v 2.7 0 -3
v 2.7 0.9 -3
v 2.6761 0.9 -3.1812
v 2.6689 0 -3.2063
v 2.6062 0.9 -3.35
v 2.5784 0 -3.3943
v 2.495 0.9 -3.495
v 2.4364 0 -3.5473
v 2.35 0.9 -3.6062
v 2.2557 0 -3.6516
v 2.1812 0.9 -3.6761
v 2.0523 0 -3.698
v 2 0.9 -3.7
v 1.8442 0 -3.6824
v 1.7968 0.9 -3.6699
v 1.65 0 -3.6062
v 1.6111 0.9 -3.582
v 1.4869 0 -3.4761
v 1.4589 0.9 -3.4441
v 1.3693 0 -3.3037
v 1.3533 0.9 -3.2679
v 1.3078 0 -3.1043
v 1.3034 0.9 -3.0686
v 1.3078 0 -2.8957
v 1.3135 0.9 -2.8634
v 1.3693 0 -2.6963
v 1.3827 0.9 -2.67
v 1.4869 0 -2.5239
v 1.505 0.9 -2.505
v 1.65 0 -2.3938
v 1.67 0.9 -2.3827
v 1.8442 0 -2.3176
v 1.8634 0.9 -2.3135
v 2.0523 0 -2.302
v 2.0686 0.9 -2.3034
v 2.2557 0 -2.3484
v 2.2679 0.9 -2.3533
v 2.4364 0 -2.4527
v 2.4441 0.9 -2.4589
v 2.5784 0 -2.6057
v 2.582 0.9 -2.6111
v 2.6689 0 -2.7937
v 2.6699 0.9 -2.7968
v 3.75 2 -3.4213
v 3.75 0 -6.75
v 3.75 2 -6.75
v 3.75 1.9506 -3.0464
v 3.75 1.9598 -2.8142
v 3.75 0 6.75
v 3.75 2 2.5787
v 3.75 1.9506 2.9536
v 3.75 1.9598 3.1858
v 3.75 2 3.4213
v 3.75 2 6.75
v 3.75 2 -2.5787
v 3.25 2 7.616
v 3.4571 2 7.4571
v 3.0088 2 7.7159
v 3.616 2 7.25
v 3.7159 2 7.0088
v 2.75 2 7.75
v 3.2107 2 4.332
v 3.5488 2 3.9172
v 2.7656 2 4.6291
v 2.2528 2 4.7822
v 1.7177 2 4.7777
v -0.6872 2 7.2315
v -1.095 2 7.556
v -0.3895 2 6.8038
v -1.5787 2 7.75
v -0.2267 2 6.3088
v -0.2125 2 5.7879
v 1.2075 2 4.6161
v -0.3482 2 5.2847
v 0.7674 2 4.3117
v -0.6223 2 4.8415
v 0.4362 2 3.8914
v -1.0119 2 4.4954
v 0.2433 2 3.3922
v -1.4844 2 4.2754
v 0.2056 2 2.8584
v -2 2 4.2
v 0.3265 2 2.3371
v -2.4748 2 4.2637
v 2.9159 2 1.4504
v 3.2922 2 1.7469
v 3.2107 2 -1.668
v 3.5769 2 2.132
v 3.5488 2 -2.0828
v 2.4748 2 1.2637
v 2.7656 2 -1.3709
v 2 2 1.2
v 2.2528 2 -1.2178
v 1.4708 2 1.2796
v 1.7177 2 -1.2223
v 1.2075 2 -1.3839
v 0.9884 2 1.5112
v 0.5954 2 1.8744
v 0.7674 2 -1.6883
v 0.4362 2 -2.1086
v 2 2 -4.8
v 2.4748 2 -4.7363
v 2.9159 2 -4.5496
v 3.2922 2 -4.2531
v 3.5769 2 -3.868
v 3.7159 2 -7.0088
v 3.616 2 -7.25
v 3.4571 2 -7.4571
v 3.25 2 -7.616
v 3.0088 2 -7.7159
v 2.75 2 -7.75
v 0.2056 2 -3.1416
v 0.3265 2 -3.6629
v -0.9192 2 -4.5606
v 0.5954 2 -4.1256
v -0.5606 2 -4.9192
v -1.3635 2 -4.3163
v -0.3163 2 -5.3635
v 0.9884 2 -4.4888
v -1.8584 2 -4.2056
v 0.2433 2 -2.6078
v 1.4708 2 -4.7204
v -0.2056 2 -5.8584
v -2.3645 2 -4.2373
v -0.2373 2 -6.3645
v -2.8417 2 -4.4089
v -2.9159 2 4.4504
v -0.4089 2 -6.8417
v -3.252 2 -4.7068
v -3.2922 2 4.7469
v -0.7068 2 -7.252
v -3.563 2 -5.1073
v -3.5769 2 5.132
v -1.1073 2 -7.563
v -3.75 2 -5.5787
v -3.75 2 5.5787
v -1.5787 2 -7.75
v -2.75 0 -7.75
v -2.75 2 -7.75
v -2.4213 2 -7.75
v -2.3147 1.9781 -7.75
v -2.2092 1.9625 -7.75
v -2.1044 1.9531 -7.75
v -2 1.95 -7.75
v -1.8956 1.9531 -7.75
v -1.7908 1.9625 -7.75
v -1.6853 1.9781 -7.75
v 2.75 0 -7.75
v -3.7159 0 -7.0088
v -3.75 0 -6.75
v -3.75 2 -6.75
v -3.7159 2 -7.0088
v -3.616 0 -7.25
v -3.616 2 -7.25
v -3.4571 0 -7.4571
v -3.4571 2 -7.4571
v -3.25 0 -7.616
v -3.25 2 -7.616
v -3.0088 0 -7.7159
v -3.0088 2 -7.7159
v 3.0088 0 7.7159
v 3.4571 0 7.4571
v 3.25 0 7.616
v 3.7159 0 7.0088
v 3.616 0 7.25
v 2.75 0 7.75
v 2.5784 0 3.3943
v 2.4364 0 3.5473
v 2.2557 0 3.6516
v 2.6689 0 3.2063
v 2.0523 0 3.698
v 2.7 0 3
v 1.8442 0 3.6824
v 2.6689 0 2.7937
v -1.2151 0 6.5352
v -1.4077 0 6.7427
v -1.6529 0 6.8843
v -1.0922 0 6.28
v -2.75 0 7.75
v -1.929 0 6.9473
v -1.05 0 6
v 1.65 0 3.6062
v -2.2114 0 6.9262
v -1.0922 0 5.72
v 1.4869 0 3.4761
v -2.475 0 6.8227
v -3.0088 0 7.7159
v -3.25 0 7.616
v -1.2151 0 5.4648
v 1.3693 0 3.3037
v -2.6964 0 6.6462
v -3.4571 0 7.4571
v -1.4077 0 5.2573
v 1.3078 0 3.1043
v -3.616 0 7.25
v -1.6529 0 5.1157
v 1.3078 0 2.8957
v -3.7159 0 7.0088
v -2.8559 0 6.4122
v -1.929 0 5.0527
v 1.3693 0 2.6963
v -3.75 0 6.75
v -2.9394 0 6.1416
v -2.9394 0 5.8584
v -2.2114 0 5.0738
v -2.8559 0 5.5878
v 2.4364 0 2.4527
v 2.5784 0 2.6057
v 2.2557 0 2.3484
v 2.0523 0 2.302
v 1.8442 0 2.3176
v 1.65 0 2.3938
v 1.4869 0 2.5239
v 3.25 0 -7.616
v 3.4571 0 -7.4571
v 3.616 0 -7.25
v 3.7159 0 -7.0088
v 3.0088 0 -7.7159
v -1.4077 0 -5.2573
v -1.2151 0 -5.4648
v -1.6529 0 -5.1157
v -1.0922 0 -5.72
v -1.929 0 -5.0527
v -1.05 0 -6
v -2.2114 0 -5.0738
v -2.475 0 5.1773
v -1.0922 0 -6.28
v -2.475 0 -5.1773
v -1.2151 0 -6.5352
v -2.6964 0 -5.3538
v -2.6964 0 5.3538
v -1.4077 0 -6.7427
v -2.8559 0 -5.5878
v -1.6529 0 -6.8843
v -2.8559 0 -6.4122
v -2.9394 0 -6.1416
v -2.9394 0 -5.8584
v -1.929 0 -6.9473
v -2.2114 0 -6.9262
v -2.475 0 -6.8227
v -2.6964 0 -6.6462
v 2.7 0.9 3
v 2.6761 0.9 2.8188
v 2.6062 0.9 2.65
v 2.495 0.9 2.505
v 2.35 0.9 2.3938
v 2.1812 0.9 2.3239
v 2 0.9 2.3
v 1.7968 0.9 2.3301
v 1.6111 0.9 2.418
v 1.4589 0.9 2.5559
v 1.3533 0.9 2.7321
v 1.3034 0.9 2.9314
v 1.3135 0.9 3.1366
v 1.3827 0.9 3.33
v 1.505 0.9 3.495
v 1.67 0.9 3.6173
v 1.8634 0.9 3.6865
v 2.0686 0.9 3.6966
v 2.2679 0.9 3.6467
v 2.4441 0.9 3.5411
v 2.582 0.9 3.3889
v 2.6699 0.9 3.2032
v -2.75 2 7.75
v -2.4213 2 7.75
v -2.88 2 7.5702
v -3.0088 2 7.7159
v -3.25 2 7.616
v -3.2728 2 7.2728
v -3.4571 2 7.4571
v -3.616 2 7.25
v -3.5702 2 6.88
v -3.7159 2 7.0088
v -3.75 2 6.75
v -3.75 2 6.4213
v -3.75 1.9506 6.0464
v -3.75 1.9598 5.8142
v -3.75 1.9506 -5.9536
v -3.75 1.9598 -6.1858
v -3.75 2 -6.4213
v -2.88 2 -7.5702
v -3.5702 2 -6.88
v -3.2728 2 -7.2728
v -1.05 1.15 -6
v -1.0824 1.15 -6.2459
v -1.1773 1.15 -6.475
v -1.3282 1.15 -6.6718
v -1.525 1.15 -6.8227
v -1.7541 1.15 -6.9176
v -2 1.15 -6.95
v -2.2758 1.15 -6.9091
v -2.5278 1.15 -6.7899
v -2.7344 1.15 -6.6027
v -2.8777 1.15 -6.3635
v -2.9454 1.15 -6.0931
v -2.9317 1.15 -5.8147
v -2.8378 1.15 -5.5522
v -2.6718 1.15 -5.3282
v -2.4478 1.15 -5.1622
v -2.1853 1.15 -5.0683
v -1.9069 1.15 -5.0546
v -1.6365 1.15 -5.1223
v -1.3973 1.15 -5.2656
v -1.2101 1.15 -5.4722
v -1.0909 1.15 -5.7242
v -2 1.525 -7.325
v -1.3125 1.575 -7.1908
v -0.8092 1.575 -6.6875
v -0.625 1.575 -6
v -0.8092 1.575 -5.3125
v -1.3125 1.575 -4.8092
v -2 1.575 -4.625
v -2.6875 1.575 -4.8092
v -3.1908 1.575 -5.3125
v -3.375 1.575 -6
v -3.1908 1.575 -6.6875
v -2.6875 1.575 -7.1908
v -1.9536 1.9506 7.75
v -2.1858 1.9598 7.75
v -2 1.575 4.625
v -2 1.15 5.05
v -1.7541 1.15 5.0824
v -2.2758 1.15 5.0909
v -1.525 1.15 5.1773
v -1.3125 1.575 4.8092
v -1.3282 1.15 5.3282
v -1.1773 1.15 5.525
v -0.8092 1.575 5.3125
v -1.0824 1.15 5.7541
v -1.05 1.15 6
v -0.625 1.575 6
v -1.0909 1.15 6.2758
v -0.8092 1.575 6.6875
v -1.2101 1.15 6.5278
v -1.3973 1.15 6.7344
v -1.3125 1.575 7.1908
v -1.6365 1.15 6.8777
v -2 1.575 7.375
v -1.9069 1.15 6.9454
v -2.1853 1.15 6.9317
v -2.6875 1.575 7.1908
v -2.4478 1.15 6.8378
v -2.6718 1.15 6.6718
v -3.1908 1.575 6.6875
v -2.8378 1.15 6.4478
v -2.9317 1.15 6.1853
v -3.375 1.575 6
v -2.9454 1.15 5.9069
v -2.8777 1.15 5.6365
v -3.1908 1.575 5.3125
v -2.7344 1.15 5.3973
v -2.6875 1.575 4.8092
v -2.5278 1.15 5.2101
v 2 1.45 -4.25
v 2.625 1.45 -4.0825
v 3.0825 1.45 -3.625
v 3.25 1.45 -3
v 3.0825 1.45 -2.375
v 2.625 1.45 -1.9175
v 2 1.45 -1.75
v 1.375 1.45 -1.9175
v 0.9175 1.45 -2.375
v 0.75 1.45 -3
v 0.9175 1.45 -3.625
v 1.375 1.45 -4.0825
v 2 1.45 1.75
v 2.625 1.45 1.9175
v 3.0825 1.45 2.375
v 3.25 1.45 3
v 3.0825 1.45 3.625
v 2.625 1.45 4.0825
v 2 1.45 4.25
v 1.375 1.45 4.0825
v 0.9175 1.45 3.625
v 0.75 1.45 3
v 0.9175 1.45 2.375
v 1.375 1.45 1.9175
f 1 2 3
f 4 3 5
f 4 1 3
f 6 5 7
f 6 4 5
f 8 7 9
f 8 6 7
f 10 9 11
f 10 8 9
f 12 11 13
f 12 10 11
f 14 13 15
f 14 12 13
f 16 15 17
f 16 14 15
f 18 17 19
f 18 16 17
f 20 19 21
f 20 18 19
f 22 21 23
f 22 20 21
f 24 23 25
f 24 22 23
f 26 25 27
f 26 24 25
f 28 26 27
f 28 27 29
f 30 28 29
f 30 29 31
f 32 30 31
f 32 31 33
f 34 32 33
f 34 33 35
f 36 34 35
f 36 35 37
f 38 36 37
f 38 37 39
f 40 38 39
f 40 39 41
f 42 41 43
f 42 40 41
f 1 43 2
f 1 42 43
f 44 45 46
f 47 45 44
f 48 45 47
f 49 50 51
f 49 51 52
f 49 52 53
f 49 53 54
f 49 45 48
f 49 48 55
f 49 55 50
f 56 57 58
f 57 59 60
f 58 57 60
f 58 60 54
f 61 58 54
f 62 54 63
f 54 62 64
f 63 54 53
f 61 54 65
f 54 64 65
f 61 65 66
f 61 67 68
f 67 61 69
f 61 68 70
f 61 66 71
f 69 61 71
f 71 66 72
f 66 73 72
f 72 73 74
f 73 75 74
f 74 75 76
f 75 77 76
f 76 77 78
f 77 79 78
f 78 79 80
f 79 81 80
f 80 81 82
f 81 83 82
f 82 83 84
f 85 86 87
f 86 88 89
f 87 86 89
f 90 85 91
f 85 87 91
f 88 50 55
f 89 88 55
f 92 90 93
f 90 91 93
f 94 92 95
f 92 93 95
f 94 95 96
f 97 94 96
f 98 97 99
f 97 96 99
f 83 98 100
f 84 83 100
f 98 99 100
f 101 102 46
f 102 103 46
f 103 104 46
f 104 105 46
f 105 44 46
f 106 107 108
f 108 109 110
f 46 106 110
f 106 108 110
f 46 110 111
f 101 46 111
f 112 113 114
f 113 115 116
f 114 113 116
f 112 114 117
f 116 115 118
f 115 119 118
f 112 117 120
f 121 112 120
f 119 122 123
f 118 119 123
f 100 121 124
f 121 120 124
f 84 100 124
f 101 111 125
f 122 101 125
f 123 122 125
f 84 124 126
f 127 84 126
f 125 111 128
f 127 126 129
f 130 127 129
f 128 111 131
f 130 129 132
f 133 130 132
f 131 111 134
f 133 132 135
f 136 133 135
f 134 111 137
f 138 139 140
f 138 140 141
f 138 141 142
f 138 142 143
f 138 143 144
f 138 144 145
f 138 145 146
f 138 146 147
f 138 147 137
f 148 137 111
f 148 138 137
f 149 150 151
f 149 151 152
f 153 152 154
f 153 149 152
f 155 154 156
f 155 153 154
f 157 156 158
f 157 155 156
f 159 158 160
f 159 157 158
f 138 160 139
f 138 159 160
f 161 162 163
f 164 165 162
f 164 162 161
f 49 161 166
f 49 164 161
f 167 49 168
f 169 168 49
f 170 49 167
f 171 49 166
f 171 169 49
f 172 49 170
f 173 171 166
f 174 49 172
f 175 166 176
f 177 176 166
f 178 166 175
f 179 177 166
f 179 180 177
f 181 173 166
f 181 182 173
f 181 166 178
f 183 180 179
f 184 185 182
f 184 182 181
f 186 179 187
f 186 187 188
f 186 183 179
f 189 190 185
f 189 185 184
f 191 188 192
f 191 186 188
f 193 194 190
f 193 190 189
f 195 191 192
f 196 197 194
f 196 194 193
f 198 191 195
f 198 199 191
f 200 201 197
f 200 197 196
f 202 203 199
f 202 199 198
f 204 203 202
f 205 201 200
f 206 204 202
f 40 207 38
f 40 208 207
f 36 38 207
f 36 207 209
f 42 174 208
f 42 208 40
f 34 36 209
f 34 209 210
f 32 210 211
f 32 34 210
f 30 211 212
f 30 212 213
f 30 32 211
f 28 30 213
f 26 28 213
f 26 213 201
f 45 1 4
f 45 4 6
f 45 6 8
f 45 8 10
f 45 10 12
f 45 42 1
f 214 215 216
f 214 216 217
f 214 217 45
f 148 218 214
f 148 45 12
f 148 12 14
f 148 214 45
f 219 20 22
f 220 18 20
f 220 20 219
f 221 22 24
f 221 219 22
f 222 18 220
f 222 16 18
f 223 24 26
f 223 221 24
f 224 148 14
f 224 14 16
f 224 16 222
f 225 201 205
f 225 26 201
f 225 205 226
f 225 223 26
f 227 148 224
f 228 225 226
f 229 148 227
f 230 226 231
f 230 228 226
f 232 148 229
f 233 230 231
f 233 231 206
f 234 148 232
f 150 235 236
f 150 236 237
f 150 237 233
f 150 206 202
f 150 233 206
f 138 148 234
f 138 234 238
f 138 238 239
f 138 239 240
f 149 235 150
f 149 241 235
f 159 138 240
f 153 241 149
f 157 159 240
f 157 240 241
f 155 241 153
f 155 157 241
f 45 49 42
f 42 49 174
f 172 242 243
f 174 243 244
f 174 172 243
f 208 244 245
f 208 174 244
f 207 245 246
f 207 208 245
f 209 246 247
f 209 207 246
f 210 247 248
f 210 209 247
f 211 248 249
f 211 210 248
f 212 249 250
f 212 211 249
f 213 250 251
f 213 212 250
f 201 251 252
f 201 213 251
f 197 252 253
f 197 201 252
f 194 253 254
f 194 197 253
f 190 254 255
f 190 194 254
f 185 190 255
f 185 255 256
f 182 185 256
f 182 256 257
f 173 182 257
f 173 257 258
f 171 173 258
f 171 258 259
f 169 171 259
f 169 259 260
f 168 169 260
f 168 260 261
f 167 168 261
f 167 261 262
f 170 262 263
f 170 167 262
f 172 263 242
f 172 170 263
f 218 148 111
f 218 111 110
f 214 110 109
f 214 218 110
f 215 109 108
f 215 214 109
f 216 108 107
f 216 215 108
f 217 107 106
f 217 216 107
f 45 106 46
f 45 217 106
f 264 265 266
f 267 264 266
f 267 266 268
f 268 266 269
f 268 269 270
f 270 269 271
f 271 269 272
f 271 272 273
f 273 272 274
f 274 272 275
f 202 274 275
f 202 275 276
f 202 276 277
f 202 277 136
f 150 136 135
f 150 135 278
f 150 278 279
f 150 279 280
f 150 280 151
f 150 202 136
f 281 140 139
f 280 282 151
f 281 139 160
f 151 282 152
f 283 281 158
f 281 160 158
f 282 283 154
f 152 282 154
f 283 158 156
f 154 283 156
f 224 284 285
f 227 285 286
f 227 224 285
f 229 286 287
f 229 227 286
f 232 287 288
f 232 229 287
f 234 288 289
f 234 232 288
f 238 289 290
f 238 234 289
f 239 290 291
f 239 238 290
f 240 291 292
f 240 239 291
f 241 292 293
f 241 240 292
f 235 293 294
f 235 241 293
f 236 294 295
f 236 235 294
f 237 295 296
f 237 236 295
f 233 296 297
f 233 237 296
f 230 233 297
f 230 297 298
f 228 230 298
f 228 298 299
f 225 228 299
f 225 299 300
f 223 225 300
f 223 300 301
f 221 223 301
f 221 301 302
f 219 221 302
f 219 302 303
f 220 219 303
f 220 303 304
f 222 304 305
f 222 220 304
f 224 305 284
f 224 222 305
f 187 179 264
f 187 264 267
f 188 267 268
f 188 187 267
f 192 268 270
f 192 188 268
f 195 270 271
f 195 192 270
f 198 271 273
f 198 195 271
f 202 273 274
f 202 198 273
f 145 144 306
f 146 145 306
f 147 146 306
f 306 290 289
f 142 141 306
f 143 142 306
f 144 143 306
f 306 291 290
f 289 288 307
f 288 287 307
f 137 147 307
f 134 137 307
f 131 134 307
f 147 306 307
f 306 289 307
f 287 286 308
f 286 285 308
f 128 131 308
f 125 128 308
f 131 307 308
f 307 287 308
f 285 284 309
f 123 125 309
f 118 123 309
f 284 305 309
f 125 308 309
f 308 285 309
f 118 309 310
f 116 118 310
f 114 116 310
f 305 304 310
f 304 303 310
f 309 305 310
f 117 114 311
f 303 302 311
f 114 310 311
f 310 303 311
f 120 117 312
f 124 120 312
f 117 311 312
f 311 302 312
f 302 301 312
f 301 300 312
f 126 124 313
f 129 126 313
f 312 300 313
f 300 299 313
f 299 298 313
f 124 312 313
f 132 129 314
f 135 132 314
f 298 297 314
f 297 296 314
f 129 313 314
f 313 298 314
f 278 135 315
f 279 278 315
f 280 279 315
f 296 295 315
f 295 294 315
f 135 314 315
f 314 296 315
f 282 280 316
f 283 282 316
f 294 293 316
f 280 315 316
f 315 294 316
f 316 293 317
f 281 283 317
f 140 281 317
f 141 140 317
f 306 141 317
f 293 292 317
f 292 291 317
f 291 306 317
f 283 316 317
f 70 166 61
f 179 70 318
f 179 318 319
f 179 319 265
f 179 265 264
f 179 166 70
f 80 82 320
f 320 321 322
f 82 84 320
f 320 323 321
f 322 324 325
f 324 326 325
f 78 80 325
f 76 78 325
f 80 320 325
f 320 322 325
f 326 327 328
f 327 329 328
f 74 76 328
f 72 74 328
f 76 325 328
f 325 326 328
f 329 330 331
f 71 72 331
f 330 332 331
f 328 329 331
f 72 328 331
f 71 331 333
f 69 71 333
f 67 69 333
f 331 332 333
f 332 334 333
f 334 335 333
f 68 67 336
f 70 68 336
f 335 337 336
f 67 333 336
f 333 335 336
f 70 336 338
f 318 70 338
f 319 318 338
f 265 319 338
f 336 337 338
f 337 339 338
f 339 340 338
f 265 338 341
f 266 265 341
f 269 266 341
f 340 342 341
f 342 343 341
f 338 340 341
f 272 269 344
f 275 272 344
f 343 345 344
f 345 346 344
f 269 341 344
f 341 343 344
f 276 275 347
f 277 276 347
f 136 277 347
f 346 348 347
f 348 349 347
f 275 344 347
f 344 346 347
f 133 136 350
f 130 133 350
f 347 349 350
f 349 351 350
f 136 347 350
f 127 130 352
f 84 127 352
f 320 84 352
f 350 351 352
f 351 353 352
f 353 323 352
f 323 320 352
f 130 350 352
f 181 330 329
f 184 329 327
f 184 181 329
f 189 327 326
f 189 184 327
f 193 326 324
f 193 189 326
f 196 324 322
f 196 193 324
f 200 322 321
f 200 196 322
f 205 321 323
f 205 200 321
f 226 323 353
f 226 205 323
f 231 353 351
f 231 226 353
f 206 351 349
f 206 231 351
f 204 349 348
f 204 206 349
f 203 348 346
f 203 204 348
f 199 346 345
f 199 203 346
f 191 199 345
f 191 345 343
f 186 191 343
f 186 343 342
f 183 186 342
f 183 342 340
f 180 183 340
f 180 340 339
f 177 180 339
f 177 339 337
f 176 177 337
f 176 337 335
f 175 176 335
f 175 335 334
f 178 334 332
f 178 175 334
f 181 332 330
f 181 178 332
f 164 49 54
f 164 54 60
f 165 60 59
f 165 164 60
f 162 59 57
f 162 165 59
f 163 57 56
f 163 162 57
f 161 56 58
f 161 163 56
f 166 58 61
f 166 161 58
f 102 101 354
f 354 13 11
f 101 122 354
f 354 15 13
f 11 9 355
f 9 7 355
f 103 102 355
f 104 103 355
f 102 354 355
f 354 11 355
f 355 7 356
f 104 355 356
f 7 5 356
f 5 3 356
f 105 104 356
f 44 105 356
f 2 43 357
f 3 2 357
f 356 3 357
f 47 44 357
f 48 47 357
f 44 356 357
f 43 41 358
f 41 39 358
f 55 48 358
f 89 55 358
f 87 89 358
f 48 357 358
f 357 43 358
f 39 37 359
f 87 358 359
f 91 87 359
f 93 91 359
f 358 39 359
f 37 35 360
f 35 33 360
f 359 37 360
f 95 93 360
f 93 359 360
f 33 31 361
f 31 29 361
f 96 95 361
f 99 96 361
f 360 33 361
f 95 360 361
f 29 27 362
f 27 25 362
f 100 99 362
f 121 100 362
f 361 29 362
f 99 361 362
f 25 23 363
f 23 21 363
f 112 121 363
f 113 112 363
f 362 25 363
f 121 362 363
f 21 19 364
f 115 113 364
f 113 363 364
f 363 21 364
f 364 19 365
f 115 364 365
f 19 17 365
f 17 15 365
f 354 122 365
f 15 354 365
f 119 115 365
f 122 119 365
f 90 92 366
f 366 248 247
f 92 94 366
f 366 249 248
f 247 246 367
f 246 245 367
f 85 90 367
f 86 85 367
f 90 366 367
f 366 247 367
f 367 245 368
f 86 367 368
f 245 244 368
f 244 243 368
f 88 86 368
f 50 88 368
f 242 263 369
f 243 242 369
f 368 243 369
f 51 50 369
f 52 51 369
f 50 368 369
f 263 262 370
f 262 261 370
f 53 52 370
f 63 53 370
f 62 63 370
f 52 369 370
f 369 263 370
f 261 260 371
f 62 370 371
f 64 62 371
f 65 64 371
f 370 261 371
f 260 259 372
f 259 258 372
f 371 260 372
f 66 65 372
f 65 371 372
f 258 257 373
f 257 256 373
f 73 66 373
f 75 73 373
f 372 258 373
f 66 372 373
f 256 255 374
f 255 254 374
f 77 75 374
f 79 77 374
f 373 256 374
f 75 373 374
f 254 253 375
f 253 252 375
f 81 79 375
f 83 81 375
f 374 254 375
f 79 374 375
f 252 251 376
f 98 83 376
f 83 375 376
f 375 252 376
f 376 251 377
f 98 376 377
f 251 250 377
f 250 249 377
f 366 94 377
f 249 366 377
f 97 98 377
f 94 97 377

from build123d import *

# Parameters (mm, degrees)
SKETCH1_R                                       = 0.95
SKETCH1_R_2                                     = 0.7
BOSS_EXTRUDE1_DEPTH                             = 2
CSK_FOR_M2_FLAT_HEAD_MACHINE_SCREW1_D           = 1.4
CSK_FOR_M2_FLAT_HEAD_MACHINE_SCREW1_CSINK_D     = 3.6
CSK_FOR_M2_FLAT_HEAD_MACHINE_SCREW1_CSINK_ANGLE = 90


with BuildPart() as part:
    # Sketch1 → Boss-Extrude1 (new body)
    with BuildSketch(Plane(origin=(0, 0, 0), x_dir=(1, 0, 0), z_dir=(0, 1, 0))):
        with BuildLine():
            Line((-2.75, 7.75), (2.75, 7.75))
            ThreePointArc((2.75, 7.75), (3.457106781, 7.457106781), (3.75, 6.75))
            Line((3.75, 6.75), (3.75, -6.75))
            ThreePointArc((3.75, -6.75), (3.457106781, -7.457106781), (2.75, -7.75))
            Line((2.75, -7.75), (-2.75, -7.75))
            ThreePointArc((-2.75, -7.75), (-3.457106781, -7.457106781), (-3.75, -6.75))
            Line((-3.75, -6.75), (-3.75, 6.75))
            ThreePointArc((-3.75, 6.75), (-3.457106781, 7.457106781), (-2.75, 7.75))
        make_face()
        with Locations((-2, 6)):
            Circle(SKETCH1_R, mode=Mode.SUBTRACT)
        with Locations((-2, -6)):
            Circle(SKETCH1_R, mode=Mode.SUBTRACT)
        with Locations((2, 3)):
            Circle(SKETCH1_R_2, mode=Mode.SUBTRACT)
        with Locations((2, -3)):
            Circle(SKETCH1_R_2, mode=Mode.SUBTRACT)
    extrude(amount=BOSS_EXTRUDE1_DEPTH)

    # CSK for M2 Flat Head Machine Screw1 (through all)
    with Locations(Plane(origin=(-2, 2, 6), x_dir=(0, 0, 1), z_dir=(0, 1, 0))):
        with Locations((0, 0), (-12, 0), (-3, 4), (-9, 4)):
            CounterSinkHole(CSK_FOR_M2_FLAT_HEAD_MACHINE_SCREW1_D / 2, CSK_FOR_M2_FLAT_HEAD_MACHINE_SCREW1_CSINK_D / 2, counter_sink_angle=CSK_FOR_M2_FLAT_HEAD_MACHINE_SCREW1_CSINK_ANGLE)


solid = part.part
